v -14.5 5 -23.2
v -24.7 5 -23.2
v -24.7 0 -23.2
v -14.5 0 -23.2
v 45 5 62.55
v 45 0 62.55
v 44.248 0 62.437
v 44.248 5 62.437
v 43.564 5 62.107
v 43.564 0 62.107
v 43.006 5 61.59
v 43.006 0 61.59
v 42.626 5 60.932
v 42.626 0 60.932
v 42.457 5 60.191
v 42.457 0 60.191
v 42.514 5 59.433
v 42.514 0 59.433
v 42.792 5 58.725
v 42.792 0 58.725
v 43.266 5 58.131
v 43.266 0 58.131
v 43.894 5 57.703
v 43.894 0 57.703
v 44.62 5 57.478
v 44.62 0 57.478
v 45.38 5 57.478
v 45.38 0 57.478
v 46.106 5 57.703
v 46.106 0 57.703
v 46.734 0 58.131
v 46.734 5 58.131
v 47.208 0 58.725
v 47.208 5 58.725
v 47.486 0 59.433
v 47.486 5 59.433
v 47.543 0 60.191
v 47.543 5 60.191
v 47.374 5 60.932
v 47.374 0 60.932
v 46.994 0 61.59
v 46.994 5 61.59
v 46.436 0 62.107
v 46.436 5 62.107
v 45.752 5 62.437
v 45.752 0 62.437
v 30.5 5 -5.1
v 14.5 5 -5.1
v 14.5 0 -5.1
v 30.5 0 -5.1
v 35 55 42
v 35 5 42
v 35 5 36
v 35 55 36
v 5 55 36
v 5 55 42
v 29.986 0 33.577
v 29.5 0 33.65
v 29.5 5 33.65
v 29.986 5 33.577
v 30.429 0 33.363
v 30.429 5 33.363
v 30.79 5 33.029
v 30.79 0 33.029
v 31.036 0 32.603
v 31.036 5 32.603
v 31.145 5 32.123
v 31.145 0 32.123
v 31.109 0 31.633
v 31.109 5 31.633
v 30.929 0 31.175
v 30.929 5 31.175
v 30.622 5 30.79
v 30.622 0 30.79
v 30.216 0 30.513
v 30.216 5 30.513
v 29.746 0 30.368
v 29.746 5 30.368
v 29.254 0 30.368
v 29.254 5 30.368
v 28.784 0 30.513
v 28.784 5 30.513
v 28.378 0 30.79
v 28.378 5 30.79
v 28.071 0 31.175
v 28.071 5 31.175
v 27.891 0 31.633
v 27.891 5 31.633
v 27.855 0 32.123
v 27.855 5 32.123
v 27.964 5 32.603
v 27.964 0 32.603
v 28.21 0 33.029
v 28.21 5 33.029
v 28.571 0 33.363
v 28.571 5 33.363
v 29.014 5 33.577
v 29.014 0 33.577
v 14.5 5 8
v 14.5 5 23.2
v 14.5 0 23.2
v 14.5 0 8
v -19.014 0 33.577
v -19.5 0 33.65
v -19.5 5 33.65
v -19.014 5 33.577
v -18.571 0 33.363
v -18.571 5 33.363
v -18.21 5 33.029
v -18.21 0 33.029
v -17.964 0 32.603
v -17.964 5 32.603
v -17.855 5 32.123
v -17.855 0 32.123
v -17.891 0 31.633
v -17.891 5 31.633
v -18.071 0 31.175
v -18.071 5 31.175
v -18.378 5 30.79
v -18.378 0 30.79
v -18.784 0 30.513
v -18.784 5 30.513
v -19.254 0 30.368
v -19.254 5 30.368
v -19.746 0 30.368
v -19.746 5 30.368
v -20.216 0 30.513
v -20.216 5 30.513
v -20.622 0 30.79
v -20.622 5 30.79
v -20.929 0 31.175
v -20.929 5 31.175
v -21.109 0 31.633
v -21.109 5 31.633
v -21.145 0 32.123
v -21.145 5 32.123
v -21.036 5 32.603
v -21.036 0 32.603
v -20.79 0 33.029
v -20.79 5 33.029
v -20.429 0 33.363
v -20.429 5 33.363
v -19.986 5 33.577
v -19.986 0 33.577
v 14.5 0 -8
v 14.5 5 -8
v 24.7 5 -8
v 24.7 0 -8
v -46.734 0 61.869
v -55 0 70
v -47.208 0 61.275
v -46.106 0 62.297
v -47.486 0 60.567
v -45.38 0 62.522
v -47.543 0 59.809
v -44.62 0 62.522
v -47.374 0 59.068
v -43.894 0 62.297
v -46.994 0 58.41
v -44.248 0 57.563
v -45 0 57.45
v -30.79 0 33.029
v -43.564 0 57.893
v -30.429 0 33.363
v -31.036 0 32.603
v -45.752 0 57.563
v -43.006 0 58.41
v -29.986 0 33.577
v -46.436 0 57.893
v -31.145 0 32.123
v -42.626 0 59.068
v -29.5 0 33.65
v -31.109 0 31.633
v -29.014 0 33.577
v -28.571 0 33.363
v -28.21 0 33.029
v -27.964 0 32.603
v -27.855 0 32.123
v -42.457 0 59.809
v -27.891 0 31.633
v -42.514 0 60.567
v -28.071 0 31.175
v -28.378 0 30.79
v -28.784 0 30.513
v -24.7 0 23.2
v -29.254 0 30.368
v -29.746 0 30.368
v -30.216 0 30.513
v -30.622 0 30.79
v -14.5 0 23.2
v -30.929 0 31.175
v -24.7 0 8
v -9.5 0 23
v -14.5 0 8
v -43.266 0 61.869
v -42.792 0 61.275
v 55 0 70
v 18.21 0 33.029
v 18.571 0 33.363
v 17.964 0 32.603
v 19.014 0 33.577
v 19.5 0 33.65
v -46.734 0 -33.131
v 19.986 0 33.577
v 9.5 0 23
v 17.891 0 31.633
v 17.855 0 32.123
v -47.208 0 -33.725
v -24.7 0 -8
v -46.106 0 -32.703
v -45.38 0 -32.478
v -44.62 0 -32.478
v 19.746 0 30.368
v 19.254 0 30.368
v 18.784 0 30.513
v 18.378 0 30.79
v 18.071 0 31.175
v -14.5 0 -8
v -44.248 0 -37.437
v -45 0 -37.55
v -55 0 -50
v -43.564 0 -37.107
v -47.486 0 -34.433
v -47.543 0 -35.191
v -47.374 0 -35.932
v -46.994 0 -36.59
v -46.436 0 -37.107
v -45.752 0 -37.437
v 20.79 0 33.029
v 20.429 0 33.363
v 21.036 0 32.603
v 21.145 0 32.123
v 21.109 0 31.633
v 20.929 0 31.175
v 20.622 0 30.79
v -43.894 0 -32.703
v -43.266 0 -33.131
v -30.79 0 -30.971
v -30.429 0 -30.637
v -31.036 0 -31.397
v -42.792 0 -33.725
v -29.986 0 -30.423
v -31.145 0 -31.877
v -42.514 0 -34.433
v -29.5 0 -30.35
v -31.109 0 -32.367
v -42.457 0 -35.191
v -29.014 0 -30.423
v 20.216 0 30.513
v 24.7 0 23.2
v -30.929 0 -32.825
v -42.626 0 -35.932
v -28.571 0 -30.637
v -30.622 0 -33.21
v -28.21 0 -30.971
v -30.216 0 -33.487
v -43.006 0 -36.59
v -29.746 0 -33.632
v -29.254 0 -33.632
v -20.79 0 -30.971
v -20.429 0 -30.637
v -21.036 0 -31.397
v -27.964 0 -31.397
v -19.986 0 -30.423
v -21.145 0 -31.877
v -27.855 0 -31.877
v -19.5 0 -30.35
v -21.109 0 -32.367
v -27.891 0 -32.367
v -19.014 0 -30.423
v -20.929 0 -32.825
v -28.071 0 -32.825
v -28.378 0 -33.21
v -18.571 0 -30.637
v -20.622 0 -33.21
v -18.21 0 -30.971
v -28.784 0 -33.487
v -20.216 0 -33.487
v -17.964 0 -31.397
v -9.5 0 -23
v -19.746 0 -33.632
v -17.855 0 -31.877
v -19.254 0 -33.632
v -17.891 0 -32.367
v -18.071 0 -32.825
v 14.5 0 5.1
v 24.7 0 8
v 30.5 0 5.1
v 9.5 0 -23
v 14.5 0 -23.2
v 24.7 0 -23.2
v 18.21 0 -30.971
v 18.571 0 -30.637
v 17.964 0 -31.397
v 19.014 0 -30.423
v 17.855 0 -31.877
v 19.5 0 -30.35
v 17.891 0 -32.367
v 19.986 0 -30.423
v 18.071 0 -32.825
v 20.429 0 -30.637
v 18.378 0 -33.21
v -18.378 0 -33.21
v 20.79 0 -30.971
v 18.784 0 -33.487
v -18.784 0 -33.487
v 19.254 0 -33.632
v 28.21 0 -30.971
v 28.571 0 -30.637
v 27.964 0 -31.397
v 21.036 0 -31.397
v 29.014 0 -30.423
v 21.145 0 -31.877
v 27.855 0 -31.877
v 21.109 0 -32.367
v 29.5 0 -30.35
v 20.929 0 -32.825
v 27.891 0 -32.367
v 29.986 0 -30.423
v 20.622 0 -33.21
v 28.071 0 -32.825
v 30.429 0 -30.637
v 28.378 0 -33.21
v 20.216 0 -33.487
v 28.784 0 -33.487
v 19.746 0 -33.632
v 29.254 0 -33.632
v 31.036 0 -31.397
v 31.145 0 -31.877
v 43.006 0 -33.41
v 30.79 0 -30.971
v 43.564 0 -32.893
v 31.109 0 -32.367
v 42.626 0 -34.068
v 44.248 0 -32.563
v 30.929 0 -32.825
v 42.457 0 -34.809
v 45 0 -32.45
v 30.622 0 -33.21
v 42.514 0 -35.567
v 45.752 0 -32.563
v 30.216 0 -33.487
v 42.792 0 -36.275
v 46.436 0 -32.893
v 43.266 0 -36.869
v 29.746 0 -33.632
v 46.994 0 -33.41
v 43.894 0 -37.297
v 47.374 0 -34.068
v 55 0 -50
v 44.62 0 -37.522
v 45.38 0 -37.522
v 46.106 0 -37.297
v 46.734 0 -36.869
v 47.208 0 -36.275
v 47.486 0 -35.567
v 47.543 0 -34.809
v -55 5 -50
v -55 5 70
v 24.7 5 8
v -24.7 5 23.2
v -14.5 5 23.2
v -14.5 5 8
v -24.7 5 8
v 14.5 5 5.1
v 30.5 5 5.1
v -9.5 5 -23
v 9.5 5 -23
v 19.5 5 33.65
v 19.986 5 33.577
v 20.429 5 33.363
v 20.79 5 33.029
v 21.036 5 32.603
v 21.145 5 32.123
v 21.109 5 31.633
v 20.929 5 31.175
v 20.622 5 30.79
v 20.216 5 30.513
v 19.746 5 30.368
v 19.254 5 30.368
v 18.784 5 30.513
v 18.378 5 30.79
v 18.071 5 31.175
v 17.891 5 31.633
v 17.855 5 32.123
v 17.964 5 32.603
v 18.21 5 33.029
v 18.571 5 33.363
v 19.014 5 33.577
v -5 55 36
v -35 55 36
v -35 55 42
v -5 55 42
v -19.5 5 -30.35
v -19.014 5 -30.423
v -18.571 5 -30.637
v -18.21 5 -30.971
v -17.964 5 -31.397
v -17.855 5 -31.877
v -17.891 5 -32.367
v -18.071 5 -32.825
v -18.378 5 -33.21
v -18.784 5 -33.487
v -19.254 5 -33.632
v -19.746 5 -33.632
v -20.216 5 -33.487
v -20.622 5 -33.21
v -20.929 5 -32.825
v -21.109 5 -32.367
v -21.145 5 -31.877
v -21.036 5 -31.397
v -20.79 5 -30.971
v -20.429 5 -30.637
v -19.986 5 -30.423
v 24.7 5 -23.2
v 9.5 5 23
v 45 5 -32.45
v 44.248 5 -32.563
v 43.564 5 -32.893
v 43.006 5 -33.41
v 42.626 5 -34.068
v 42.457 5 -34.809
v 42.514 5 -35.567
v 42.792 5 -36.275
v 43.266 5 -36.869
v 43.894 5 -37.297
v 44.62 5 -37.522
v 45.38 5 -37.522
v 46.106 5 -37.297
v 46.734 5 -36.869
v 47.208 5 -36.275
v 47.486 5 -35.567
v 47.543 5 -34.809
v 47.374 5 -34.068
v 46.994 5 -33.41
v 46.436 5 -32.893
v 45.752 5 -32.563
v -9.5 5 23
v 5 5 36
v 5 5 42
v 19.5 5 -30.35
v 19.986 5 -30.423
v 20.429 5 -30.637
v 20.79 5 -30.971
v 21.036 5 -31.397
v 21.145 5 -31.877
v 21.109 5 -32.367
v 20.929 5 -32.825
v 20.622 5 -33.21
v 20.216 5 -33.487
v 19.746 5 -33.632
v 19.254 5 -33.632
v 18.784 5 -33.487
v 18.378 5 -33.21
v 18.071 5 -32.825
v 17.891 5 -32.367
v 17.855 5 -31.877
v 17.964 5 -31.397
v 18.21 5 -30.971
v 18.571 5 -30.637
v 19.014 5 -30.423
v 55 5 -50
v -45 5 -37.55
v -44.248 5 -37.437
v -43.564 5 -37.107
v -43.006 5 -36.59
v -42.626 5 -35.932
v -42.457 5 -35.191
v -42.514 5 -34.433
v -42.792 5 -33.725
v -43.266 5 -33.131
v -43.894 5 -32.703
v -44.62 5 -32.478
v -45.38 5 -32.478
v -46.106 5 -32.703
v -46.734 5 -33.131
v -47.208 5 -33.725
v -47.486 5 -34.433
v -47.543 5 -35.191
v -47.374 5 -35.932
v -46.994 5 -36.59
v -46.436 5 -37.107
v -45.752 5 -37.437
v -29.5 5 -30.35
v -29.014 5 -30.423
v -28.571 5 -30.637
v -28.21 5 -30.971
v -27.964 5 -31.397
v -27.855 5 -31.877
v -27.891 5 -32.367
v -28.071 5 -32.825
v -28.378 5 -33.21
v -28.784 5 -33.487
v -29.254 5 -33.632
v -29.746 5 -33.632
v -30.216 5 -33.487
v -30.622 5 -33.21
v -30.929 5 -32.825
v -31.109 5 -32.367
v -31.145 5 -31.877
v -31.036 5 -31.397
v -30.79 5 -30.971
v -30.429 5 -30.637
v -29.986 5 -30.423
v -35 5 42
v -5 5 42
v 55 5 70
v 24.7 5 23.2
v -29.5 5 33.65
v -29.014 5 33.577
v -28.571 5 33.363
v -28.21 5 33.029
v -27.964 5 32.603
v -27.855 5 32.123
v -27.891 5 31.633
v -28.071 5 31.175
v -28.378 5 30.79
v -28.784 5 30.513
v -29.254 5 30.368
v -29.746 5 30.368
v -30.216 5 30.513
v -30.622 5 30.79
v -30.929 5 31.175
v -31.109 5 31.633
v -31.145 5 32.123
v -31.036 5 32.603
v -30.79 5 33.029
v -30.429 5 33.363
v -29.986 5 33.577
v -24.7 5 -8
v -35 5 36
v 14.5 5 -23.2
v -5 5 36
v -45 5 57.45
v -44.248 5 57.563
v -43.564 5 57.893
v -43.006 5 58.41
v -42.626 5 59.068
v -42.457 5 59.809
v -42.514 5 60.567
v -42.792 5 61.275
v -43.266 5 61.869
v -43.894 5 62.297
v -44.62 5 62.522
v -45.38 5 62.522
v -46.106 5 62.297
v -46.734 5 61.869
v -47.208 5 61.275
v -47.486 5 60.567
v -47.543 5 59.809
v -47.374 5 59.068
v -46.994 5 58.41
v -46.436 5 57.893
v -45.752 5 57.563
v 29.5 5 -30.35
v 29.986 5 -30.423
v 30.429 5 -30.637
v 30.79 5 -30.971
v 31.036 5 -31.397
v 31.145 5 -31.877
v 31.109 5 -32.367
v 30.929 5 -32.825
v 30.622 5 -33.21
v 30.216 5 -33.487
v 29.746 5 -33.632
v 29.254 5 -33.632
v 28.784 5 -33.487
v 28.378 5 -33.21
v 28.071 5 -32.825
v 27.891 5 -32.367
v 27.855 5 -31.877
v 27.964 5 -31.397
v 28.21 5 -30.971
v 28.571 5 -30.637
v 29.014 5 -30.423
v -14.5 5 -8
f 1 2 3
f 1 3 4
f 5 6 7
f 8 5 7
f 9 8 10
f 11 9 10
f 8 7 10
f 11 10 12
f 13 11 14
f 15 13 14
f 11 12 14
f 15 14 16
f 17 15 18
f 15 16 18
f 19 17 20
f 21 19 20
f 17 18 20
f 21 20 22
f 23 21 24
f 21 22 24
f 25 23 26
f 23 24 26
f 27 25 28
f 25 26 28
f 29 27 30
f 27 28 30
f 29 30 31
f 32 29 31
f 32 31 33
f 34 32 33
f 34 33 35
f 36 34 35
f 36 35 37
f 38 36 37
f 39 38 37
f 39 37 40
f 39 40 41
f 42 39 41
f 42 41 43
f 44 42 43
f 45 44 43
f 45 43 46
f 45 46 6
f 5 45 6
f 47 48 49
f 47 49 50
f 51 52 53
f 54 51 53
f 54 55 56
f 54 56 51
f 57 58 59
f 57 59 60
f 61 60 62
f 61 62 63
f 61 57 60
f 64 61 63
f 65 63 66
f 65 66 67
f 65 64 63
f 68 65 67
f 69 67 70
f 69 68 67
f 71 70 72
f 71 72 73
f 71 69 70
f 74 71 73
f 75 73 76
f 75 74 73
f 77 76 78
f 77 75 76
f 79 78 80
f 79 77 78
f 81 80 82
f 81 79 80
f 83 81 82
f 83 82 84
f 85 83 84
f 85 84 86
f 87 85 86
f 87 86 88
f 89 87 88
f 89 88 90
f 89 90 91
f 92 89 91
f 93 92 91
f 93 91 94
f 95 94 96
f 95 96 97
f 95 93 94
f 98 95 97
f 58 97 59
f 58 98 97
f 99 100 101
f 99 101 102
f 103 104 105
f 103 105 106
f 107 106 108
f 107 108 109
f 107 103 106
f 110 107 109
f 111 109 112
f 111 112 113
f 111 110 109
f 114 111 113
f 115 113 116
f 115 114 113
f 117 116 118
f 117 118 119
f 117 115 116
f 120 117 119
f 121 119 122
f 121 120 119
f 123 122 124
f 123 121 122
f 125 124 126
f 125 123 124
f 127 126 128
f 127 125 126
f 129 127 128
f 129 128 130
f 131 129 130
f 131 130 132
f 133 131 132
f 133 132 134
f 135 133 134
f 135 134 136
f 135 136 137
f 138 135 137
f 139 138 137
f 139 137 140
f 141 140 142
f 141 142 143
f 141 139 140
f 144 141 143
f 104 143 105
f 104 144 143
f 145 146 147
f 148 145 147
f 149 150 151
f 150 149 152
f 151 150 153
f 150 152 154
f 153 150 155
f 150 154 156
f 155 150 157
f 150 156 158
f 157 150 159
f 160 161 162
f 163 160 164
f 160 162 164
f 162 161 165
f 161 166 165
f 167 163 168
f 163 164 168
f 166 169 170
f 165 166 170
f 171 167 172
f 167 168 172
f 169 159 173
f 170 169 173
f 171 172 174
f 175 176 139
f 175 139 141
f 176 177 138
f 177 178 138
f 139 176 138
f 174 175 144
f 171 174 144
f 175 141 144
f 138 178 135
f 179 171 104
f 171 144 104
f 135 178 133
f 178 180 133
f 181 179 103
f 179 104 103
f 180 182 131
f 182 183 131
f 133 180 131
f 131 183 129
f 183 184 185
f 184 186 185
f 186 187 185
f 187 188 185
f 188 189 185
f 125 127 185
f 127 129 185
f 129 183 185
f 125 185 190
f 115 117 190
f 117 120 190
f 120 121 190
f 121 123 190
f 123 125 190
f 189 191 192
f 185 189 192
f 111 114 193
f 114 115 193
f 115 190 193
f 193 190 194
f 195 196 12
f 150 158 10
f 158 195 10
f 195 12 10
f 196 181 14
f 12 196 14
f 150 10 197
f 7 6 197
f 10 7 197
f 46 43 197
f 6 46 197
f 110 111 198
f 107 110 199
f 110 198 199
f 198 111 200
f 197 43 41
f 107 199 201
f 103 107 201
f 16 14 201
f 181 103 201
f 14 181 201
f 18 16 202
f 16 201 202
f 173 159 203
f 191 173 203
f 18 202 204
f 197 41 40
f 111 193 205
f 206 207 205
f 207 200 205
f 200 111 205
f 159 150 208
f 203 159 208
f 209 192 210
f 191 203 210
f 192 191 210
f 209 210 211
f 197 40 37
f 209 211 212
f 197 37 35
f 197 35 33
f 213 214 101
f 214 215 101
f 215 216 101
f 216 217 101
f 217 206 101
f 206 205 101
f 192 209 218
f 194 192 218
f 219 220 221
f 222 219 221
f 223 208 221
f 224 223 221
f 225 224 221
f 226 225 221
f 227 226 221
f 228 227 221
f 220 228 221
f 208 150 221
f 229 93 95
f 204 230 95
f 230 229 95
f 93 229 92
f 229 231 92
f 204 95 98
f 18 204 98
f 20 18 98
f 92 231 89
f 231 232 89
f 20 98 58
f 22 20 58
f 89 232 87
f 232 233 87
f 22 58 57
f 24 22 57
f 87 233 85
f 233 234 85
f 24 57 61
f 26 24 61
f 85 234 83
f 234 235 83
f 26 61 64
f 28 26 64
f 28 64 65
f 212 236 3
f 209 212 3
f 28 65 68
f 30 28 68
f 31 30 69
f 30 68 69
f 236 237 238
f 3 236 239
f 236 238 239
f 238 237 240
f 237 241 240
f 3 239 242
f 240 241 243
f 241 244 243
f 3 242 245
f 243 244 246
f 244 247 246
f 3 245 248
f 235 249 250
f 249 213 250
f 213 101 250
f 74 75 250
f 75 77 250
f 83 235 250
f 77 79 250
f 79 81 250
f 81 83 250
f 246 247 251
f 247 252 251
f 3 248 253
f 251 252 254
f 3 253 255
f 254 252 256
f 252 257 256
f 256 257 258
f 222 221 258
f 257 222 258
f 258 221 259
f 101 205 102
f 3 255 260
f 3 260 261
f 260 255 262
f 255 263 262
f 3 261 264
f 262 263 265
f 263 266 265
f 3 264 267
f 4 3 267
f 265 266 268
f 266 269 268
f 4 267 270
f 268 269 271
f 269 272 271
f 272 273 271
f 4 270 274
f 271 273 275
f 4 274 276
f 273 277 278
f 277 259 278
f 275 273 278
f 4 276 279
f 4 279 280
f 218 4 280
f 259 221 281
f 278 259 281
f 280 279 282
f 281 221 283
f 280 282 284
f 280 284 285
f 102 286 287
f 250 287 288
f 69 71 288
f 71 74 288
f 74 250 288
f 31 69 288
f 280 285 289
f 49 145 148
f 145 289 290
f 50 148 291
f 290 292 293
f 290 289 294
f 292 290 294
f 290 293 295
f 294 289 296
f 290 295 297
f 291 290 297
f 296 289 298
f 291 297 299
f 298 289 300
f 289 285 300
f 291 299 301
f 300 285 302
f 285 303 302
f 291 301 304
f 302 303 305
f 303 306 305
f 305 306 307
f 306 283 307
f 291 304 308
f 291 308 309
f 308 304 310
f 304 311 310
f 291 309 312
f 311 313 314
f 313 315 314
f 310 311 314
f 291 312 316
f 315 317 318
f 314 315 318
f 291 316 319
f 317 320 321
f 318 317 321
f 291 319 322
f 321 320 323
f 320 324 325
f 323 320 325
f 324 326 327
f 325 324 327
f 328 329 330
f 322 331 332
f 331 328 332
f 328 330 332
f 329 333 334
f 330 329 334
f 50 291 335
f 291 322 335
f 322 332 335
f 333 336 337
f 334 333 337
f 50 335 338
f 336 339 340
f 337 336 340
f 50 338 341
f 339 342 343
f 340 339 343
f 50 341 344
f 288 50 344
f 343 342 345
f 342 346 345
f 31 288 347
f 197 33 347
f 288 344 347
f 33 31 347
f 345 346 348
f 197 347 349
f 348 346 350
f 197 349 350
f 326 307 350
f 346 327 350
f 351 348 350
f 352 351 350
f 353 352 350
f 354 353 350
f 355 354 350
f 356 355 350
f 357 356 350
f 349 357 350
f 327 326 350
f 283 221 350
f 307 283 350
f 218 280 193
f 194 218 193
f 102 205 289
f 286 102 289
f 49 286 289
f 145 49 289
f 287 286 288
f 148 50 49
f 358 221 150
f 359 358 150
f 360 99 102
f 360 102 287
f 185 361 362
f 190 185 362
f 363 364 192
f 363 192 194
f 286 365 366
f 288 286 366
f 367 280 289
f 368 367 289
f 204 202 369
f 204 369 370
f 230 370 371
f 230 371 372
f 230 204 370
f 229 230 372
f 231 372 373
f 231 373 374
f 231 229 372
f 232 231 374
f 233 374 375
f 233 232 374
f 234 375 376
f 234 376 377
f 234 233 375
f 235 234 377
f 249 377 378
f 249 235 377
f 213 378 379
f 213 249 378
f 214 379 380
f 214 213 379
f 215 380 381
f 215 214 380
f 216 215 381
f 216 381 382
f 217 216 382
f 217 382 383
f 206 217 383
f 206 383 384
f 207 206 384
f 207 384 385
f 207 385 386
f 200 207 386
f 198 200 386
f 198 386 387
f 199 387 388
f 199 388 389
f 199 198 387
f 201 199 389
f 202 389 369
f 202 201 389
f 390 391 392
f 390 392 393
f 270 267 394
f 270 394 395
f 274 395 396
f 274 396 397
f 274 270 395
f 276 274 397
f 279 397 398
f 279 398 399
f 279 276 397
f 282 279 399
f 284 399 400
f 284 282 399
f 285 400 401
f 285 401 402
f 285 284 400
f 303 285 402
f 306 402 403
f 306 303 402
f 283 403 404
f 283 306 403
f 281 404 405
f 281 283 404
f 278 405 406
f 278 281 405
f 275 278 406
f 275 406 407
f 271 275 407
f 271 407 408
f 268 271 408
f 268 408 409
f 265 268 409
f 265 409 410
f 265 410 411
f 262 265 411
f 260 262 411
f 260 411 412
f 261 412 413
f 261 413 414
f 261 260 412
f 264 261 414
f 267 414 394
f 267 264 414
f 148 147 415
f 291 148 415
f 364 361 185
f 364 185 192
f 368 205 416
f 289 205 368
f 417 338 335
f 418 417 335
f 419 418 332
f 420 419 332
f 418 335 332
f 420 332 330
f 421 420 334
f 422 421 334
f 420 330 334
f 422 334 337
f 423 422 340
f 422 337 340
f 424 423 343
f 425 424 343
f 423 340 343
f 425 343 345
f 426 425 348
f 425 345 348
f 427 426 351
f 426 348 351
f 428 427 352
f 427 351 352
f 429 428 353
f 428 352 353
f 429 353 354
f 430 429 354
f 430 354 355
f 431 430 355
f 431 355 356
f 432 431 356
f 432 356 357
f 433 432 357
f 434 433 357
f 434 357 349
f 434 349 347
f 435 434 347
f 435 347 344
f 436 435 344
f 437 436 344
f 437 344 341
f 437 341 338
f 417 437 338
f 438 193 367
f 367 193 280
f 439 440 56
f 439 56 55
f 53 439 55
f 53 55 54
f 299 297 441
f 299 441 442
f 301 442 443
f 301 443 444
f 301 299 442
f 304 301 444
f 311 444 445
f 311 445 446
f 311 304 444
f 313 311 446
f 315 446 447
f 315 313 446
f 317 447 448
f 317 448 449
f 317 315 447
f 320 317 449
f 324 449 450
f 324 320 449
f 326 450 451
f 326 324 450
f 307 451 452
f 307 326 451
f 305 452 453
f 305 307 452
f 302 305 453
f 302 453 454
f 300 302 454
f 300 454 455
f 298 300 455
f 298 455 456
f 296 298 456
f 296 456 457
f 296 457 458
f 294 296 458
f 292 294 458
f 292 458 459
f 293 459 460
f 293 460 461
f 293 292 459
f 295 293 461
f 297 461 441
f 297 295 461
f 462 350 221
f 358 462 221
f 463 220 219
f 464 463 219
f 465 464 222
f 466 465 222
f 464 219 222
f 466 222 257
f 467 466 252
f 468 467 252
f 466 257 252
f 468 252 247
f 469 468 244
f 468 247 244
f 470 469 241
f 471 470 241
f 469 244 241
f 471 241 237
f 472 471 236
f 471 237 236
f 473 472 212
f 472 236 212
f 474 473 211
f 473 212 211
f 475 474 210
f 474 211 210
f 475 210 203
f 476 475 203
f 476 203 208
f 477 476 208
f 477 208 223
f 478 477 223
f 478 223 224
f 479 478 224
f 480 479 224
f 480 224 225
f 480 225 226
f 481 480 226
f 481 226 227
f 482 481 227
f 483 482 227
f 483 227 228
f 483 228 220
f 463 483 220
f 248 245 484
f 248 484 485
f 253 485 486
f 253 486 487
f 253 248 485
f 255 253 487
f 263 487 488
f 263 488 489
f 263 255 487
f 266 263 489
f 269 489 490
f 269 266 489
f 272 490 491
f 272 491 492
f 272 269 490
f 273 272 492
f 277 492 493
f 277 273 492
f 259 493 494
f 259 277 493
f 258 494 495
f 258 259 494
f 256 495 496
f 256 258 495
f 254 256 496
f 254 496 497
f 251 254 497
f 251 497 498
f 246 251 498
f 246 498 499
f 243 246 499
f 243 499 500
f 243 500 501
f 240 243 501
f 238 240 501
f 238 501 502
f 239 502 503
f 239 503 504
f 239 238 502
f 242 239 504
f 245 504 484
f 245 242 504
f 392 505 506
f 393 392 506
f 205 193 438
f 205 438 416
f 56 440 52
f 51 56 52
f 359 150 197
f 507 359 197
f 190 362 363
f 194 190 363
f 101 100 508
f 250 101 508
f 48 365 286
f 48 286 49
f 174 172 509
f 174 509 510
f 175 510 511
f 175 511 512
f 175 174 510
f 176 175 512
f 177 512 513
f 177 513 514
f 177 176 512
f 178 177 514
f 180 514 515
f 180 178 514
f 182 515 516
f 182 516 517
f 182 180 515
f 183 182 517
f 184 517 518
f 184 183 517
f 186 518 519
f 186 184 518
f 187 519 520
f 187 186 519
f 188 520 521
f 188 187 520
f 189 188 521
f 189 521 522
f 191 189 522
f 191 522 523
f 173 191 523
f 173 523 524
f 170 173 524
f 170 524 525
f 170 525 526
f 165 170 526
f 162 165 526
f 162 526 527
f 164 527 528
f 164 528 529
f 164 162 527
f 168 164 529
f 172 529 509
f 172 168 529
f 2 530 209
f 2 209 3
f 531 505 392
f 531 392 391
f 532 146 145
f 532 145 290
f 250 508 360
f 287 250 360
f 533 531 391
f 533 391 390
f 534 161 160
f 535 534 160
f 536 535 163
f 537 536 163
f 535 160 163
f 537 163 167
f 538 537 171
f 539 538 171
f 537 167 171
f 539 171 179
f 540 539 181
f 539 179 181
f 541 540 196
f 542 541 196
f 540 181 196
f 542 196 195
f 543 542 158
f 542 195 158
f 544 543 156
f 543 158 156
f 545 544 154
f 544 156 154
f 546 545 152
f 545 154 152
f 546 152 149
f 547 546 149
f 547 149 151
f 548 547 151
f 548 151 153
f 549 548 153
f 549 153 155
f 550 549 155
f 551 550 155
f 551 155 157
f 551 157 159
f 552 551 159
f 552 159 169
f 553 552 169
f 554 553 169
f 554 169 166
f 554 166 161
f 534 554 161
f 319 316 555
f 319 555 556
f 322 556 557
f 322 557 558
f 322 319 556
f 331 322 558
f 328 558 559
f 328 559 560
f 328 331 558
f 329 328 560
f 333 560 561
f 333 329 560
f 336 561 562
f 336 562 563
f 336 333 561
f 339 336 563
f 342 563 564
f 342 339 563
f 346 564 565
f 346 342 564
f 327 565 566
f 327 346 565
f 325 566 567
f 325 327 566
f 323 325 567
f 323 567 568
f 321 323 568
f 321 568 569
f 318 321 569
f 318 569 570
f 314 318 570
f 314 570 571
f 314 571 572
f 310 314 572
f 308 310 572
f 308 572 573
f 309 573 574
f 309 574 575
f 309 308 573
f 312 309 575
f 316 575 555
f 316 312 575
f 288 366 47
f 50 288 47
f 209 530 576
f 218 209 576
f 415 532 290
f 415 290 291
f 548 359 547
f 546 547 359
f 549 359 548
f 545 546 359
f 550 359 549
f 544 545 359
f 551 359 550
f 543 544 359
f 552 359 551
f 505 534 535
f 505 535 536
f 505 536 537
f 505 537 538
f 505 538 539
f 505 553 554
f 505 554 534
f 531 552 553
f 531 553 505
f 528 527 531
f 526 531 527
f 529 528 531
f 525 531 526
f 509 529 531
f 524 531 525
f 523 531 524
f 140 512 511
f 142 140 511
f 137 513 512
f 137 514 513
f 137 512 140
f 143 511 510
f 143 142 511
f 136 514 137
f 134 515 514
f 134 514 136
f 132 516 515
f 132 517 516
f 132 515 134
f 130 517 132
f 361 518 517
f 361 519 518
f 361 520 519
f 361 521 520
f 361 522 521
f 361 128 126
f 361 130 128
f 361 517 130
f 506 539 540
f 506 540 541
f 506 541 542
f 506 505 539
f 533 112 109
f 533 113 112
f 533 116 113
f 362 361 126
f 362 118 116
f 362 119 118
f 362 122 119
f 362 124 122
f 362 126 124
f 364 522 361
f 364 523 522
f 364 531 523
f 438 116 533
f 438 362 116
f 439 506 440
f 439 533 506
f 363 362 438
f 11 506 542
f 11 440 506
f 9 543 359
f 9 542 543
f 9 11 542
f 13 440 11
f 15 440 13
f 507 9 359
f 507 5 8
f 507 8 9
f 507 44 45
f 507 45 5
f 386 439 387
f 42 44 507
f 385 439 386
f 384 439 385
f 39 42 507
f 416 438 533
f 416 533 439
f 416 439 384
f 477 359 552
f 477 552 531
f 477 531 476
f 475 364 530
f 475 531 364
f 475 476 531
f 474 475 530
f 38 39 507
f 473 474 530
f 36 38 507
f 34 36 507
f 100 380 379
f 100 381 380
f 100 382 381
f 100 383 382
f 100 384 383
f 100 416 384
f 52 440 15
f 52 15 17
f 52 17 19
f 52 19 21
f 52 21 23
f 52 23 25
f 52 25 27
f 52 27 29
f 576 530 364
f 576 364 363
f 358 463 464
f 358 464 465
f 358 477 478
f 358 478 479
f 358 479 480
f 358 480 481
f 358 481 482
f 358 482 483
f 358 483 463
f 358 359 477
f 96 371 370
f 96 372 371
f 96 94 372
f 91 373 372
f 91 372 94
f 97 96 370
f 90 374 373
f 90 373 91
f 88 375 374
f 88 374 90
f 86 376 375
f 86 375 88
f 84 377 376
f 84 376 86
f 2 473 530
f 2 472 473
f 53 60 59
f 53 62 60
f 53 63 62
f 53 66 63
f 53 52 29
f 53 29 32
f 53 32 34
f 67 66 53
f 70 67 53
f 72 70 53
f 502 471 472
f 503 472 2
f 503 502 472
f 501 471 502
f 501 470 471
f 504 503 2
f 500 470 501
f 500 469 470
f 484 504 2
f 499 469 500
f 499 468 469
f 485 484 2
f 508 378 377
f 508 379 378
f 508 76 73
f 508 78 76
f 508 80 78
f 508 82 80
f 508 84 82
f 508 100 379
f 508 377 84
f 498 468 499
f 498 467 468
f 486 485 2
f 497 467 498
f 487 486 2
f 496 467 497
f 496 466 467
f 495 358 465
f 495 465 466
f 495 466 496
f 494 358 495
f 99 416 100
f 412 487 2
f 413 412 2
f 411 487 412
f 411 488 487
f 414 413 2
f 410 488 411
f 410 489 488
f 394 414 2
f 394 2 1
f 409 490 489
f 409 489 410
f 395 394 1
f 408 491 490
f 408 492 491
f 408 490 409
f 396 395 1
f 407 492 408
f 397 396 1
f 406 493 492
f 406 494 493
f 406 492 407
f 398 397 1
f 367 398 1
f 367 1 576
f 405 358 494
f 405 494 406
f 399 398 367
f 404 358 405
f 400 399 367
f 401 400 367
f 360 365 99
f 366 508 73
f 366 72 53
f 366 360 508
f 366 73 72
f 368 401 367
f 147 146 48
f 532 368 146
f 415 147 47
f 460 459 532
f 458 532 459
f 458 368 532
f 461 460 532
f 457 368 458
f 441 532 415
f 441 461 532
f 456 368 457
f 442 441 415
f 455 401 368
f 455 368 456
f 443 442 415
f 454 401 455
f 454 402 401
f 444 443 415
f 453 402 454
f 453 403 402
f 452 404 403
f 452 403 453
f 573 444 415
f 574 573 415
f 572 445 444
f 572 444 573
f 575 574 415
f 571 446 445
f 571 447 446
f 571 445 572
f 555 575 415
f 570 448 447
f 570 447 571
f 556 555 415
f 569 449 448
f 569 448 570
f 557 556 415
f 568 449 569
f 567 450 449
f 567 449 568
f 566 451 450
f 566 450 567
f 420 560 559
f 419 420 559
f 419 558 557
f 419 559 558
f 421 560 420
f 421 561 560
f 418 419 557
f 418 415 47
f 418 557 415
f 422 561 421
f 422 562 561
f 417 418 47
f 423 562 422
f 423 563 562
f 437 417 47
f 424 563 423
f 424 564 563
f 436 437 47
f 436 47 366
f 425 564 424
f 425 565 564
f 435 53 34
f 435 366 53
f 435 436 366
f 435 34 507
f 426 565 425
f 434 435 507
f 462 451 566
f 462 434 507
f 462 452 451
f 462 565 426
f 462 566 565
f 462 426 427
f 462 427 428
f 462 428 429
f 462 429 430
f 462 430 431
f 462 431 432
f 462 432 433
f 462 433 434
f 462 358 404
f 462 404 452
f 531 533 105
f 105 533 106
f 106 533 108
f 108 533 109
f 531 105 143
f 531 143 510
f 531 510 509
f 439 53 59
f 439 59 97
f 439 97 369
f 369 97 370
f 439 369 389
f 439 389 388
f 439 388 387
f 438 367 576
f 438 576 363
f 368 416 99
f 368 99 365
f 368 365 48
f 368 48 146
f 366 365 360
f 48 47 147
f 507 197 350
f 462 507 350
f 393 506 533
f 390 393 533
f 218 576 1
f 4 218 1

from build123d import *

# Parameters (mm, degrees)
SKETCH1_R           = 1.65
SKETCH1_W           = 19
SKETCH1_H           = 46
BOSS_EXTRUDE3_DEPTH = 5
SKETCH5_R           = 2.55
CUT_EXTRUDE2_DEPTH  = 90.162772501
SKETCH9_W           = 10.2
SKETCH9_H           = 15.2
CUT_EXTRUDE3_DEPTH  = 90.162772501
SKETCH6_W           = 30
SKETCH6_H           = 6
BOSS_EXTRUDE4_DEPTH = 50
SKETCH11_W          = 16
SKETCH11_H          = 10.2
CUT_EXTRUDE4_DEPTH  = 103.102889283


with BuildPart() as part:
    # Sketch1 → Boss-Extrude3 (new body)
    with BuildSketch(Plane(origin=(0, 0, 0), x_dir=(1, 0, 0), z_dir=(0, 1, 0))):
        Polygon((55, 50), (-55, 50), (-55, 31.75), (-55, -31.75), (-55, -70), (-20, -70), (2.5, -70), (20, -70), (42.5, -70), (55, -70), (55, -31.75), (55, 31.75), align=None)
        with Locations(Location((-29.5, -32, 0), (0, 0, 270))):
            Circle(SKETCH1_R, mode=Mode.SUBTRACT)
        with Locations(Location((-19.5, -32, 0), (0, 0, 270))):
            Circle(SKETCH1_R, mode=Mode.SUBTRACT)
        with Locations(Location((19.5, -32, 0), (0, 0, 270))):
            Circle(SKETCH1_R, mode=Mode.SUBTRACT)
        with Locations(Location((29.5, -32, 0), (0, 0, 270))):
            Circle(SKETCH1_R, mode=Mode.SUBTRACT)
        with Locations(Location((-29.5, 32, 0), (0, 0, 270))):
            Circle(SKETCH1_R, mode=Mode.SUBTRACT)
        with Locations(Location((-19.5, 32, 0), (0, 0, 270))):
            Circle(SKETCH1_R, mode=Mode.SUBTRACT)
        Rectangle(SKETCH1_W, SKETCH1_H, mode=Mode.SUBTRACT)
        with Locations(Location((19.5, 32, 0), (0, 0, 270))):
            Circle(SKETCH1_R, mode=Mode.SUBTRACT)
        with Locations(Location((29.5, 32, 0), (0, 0, 270))):
            Circle(SKETCH1_R, mode=Mode.SUBTRACT)
    extrude(amount=BOSS_EXTRUDE3_DEPTH)

    # Sketch5 → Cut-Extrude2 (cut, through all)
    with BuildSketch(Plane.XZ):
        with Locations(Location((-45, 60, 0), (0, 0, 270))):
            Circle(SKETCH5_R)
        with Locations(Location((-45, -35, 0), (0, 0, 270))):
            Circle(SKETCH5_R)
        with Locations(Location((45, -35, 0), (0, 0, 90))):
            Circle(SKETCH5_R)
        with Locations(Location((45, 60, 0), (0, 0, 90))):
            Circle(SKETCH5_R)
    extrude(amount=-CUT_EXTRUDE2_DEPTH, mode=Mode.SUBTRACT)

    # Sketch9 → Cut-Extrude3 (cut, through all)
    with BuildSketch(Plane(origin=(0, 5, 0), x_dir=(1, 0, 0), z_dir=(0, 1, 0))):
        with Locations((-19.6, 15.6)):
            Rectangle(SKETCH9_W, SKETCH9_H)
        with Locations((-19.6, -15.6)):
            Rectangle(SKETCH9_W, SKETCH9_H)
        with Locations((19.6, -15.6)):
            Rectangle(SKETCH9_W, SKETCH9_H)
        with Locations((19.6, 15.6)):
            Rectangle(SKETCH9_W, SKETCH9_H)
    extrude(amount=-CUT_EXTRUDE3_DEPTH, mode=Mode.SUBTRACT)

    # Sketch6 → Boss-Extrude4 (add)
    with BuildSketch(Plane(origin=(0, 5, 0), x_dir=(1, 0, 0), z_dir=(0, 1, 0))):
        with Locations((-20, -39)):
            Rectangle(SKETCH6_W, SKETCH6_H)
        with Locations((20, -39)):
            Rectangle(SKETCH6_W, SKETCH6_H)
    extrude(amount=BOSS_EXTRUDE4_DEPTH)

    # Sketch11 → Cut-Extrude4 (cut, through all)
    with BuildSketch(Plane(origin=(0, 5, 0), x_dir=(1, 0, 0), z_dir=(0, 1, 0))):
        with Locations((22.5, 0)):
            Rectangle(SKETCH11_W, SKETCH11_H)
    extrude(amount=-CUT_EXTRUDE4_DEPTH, mode=Mode.SUBTRACT)


solid = part.part
